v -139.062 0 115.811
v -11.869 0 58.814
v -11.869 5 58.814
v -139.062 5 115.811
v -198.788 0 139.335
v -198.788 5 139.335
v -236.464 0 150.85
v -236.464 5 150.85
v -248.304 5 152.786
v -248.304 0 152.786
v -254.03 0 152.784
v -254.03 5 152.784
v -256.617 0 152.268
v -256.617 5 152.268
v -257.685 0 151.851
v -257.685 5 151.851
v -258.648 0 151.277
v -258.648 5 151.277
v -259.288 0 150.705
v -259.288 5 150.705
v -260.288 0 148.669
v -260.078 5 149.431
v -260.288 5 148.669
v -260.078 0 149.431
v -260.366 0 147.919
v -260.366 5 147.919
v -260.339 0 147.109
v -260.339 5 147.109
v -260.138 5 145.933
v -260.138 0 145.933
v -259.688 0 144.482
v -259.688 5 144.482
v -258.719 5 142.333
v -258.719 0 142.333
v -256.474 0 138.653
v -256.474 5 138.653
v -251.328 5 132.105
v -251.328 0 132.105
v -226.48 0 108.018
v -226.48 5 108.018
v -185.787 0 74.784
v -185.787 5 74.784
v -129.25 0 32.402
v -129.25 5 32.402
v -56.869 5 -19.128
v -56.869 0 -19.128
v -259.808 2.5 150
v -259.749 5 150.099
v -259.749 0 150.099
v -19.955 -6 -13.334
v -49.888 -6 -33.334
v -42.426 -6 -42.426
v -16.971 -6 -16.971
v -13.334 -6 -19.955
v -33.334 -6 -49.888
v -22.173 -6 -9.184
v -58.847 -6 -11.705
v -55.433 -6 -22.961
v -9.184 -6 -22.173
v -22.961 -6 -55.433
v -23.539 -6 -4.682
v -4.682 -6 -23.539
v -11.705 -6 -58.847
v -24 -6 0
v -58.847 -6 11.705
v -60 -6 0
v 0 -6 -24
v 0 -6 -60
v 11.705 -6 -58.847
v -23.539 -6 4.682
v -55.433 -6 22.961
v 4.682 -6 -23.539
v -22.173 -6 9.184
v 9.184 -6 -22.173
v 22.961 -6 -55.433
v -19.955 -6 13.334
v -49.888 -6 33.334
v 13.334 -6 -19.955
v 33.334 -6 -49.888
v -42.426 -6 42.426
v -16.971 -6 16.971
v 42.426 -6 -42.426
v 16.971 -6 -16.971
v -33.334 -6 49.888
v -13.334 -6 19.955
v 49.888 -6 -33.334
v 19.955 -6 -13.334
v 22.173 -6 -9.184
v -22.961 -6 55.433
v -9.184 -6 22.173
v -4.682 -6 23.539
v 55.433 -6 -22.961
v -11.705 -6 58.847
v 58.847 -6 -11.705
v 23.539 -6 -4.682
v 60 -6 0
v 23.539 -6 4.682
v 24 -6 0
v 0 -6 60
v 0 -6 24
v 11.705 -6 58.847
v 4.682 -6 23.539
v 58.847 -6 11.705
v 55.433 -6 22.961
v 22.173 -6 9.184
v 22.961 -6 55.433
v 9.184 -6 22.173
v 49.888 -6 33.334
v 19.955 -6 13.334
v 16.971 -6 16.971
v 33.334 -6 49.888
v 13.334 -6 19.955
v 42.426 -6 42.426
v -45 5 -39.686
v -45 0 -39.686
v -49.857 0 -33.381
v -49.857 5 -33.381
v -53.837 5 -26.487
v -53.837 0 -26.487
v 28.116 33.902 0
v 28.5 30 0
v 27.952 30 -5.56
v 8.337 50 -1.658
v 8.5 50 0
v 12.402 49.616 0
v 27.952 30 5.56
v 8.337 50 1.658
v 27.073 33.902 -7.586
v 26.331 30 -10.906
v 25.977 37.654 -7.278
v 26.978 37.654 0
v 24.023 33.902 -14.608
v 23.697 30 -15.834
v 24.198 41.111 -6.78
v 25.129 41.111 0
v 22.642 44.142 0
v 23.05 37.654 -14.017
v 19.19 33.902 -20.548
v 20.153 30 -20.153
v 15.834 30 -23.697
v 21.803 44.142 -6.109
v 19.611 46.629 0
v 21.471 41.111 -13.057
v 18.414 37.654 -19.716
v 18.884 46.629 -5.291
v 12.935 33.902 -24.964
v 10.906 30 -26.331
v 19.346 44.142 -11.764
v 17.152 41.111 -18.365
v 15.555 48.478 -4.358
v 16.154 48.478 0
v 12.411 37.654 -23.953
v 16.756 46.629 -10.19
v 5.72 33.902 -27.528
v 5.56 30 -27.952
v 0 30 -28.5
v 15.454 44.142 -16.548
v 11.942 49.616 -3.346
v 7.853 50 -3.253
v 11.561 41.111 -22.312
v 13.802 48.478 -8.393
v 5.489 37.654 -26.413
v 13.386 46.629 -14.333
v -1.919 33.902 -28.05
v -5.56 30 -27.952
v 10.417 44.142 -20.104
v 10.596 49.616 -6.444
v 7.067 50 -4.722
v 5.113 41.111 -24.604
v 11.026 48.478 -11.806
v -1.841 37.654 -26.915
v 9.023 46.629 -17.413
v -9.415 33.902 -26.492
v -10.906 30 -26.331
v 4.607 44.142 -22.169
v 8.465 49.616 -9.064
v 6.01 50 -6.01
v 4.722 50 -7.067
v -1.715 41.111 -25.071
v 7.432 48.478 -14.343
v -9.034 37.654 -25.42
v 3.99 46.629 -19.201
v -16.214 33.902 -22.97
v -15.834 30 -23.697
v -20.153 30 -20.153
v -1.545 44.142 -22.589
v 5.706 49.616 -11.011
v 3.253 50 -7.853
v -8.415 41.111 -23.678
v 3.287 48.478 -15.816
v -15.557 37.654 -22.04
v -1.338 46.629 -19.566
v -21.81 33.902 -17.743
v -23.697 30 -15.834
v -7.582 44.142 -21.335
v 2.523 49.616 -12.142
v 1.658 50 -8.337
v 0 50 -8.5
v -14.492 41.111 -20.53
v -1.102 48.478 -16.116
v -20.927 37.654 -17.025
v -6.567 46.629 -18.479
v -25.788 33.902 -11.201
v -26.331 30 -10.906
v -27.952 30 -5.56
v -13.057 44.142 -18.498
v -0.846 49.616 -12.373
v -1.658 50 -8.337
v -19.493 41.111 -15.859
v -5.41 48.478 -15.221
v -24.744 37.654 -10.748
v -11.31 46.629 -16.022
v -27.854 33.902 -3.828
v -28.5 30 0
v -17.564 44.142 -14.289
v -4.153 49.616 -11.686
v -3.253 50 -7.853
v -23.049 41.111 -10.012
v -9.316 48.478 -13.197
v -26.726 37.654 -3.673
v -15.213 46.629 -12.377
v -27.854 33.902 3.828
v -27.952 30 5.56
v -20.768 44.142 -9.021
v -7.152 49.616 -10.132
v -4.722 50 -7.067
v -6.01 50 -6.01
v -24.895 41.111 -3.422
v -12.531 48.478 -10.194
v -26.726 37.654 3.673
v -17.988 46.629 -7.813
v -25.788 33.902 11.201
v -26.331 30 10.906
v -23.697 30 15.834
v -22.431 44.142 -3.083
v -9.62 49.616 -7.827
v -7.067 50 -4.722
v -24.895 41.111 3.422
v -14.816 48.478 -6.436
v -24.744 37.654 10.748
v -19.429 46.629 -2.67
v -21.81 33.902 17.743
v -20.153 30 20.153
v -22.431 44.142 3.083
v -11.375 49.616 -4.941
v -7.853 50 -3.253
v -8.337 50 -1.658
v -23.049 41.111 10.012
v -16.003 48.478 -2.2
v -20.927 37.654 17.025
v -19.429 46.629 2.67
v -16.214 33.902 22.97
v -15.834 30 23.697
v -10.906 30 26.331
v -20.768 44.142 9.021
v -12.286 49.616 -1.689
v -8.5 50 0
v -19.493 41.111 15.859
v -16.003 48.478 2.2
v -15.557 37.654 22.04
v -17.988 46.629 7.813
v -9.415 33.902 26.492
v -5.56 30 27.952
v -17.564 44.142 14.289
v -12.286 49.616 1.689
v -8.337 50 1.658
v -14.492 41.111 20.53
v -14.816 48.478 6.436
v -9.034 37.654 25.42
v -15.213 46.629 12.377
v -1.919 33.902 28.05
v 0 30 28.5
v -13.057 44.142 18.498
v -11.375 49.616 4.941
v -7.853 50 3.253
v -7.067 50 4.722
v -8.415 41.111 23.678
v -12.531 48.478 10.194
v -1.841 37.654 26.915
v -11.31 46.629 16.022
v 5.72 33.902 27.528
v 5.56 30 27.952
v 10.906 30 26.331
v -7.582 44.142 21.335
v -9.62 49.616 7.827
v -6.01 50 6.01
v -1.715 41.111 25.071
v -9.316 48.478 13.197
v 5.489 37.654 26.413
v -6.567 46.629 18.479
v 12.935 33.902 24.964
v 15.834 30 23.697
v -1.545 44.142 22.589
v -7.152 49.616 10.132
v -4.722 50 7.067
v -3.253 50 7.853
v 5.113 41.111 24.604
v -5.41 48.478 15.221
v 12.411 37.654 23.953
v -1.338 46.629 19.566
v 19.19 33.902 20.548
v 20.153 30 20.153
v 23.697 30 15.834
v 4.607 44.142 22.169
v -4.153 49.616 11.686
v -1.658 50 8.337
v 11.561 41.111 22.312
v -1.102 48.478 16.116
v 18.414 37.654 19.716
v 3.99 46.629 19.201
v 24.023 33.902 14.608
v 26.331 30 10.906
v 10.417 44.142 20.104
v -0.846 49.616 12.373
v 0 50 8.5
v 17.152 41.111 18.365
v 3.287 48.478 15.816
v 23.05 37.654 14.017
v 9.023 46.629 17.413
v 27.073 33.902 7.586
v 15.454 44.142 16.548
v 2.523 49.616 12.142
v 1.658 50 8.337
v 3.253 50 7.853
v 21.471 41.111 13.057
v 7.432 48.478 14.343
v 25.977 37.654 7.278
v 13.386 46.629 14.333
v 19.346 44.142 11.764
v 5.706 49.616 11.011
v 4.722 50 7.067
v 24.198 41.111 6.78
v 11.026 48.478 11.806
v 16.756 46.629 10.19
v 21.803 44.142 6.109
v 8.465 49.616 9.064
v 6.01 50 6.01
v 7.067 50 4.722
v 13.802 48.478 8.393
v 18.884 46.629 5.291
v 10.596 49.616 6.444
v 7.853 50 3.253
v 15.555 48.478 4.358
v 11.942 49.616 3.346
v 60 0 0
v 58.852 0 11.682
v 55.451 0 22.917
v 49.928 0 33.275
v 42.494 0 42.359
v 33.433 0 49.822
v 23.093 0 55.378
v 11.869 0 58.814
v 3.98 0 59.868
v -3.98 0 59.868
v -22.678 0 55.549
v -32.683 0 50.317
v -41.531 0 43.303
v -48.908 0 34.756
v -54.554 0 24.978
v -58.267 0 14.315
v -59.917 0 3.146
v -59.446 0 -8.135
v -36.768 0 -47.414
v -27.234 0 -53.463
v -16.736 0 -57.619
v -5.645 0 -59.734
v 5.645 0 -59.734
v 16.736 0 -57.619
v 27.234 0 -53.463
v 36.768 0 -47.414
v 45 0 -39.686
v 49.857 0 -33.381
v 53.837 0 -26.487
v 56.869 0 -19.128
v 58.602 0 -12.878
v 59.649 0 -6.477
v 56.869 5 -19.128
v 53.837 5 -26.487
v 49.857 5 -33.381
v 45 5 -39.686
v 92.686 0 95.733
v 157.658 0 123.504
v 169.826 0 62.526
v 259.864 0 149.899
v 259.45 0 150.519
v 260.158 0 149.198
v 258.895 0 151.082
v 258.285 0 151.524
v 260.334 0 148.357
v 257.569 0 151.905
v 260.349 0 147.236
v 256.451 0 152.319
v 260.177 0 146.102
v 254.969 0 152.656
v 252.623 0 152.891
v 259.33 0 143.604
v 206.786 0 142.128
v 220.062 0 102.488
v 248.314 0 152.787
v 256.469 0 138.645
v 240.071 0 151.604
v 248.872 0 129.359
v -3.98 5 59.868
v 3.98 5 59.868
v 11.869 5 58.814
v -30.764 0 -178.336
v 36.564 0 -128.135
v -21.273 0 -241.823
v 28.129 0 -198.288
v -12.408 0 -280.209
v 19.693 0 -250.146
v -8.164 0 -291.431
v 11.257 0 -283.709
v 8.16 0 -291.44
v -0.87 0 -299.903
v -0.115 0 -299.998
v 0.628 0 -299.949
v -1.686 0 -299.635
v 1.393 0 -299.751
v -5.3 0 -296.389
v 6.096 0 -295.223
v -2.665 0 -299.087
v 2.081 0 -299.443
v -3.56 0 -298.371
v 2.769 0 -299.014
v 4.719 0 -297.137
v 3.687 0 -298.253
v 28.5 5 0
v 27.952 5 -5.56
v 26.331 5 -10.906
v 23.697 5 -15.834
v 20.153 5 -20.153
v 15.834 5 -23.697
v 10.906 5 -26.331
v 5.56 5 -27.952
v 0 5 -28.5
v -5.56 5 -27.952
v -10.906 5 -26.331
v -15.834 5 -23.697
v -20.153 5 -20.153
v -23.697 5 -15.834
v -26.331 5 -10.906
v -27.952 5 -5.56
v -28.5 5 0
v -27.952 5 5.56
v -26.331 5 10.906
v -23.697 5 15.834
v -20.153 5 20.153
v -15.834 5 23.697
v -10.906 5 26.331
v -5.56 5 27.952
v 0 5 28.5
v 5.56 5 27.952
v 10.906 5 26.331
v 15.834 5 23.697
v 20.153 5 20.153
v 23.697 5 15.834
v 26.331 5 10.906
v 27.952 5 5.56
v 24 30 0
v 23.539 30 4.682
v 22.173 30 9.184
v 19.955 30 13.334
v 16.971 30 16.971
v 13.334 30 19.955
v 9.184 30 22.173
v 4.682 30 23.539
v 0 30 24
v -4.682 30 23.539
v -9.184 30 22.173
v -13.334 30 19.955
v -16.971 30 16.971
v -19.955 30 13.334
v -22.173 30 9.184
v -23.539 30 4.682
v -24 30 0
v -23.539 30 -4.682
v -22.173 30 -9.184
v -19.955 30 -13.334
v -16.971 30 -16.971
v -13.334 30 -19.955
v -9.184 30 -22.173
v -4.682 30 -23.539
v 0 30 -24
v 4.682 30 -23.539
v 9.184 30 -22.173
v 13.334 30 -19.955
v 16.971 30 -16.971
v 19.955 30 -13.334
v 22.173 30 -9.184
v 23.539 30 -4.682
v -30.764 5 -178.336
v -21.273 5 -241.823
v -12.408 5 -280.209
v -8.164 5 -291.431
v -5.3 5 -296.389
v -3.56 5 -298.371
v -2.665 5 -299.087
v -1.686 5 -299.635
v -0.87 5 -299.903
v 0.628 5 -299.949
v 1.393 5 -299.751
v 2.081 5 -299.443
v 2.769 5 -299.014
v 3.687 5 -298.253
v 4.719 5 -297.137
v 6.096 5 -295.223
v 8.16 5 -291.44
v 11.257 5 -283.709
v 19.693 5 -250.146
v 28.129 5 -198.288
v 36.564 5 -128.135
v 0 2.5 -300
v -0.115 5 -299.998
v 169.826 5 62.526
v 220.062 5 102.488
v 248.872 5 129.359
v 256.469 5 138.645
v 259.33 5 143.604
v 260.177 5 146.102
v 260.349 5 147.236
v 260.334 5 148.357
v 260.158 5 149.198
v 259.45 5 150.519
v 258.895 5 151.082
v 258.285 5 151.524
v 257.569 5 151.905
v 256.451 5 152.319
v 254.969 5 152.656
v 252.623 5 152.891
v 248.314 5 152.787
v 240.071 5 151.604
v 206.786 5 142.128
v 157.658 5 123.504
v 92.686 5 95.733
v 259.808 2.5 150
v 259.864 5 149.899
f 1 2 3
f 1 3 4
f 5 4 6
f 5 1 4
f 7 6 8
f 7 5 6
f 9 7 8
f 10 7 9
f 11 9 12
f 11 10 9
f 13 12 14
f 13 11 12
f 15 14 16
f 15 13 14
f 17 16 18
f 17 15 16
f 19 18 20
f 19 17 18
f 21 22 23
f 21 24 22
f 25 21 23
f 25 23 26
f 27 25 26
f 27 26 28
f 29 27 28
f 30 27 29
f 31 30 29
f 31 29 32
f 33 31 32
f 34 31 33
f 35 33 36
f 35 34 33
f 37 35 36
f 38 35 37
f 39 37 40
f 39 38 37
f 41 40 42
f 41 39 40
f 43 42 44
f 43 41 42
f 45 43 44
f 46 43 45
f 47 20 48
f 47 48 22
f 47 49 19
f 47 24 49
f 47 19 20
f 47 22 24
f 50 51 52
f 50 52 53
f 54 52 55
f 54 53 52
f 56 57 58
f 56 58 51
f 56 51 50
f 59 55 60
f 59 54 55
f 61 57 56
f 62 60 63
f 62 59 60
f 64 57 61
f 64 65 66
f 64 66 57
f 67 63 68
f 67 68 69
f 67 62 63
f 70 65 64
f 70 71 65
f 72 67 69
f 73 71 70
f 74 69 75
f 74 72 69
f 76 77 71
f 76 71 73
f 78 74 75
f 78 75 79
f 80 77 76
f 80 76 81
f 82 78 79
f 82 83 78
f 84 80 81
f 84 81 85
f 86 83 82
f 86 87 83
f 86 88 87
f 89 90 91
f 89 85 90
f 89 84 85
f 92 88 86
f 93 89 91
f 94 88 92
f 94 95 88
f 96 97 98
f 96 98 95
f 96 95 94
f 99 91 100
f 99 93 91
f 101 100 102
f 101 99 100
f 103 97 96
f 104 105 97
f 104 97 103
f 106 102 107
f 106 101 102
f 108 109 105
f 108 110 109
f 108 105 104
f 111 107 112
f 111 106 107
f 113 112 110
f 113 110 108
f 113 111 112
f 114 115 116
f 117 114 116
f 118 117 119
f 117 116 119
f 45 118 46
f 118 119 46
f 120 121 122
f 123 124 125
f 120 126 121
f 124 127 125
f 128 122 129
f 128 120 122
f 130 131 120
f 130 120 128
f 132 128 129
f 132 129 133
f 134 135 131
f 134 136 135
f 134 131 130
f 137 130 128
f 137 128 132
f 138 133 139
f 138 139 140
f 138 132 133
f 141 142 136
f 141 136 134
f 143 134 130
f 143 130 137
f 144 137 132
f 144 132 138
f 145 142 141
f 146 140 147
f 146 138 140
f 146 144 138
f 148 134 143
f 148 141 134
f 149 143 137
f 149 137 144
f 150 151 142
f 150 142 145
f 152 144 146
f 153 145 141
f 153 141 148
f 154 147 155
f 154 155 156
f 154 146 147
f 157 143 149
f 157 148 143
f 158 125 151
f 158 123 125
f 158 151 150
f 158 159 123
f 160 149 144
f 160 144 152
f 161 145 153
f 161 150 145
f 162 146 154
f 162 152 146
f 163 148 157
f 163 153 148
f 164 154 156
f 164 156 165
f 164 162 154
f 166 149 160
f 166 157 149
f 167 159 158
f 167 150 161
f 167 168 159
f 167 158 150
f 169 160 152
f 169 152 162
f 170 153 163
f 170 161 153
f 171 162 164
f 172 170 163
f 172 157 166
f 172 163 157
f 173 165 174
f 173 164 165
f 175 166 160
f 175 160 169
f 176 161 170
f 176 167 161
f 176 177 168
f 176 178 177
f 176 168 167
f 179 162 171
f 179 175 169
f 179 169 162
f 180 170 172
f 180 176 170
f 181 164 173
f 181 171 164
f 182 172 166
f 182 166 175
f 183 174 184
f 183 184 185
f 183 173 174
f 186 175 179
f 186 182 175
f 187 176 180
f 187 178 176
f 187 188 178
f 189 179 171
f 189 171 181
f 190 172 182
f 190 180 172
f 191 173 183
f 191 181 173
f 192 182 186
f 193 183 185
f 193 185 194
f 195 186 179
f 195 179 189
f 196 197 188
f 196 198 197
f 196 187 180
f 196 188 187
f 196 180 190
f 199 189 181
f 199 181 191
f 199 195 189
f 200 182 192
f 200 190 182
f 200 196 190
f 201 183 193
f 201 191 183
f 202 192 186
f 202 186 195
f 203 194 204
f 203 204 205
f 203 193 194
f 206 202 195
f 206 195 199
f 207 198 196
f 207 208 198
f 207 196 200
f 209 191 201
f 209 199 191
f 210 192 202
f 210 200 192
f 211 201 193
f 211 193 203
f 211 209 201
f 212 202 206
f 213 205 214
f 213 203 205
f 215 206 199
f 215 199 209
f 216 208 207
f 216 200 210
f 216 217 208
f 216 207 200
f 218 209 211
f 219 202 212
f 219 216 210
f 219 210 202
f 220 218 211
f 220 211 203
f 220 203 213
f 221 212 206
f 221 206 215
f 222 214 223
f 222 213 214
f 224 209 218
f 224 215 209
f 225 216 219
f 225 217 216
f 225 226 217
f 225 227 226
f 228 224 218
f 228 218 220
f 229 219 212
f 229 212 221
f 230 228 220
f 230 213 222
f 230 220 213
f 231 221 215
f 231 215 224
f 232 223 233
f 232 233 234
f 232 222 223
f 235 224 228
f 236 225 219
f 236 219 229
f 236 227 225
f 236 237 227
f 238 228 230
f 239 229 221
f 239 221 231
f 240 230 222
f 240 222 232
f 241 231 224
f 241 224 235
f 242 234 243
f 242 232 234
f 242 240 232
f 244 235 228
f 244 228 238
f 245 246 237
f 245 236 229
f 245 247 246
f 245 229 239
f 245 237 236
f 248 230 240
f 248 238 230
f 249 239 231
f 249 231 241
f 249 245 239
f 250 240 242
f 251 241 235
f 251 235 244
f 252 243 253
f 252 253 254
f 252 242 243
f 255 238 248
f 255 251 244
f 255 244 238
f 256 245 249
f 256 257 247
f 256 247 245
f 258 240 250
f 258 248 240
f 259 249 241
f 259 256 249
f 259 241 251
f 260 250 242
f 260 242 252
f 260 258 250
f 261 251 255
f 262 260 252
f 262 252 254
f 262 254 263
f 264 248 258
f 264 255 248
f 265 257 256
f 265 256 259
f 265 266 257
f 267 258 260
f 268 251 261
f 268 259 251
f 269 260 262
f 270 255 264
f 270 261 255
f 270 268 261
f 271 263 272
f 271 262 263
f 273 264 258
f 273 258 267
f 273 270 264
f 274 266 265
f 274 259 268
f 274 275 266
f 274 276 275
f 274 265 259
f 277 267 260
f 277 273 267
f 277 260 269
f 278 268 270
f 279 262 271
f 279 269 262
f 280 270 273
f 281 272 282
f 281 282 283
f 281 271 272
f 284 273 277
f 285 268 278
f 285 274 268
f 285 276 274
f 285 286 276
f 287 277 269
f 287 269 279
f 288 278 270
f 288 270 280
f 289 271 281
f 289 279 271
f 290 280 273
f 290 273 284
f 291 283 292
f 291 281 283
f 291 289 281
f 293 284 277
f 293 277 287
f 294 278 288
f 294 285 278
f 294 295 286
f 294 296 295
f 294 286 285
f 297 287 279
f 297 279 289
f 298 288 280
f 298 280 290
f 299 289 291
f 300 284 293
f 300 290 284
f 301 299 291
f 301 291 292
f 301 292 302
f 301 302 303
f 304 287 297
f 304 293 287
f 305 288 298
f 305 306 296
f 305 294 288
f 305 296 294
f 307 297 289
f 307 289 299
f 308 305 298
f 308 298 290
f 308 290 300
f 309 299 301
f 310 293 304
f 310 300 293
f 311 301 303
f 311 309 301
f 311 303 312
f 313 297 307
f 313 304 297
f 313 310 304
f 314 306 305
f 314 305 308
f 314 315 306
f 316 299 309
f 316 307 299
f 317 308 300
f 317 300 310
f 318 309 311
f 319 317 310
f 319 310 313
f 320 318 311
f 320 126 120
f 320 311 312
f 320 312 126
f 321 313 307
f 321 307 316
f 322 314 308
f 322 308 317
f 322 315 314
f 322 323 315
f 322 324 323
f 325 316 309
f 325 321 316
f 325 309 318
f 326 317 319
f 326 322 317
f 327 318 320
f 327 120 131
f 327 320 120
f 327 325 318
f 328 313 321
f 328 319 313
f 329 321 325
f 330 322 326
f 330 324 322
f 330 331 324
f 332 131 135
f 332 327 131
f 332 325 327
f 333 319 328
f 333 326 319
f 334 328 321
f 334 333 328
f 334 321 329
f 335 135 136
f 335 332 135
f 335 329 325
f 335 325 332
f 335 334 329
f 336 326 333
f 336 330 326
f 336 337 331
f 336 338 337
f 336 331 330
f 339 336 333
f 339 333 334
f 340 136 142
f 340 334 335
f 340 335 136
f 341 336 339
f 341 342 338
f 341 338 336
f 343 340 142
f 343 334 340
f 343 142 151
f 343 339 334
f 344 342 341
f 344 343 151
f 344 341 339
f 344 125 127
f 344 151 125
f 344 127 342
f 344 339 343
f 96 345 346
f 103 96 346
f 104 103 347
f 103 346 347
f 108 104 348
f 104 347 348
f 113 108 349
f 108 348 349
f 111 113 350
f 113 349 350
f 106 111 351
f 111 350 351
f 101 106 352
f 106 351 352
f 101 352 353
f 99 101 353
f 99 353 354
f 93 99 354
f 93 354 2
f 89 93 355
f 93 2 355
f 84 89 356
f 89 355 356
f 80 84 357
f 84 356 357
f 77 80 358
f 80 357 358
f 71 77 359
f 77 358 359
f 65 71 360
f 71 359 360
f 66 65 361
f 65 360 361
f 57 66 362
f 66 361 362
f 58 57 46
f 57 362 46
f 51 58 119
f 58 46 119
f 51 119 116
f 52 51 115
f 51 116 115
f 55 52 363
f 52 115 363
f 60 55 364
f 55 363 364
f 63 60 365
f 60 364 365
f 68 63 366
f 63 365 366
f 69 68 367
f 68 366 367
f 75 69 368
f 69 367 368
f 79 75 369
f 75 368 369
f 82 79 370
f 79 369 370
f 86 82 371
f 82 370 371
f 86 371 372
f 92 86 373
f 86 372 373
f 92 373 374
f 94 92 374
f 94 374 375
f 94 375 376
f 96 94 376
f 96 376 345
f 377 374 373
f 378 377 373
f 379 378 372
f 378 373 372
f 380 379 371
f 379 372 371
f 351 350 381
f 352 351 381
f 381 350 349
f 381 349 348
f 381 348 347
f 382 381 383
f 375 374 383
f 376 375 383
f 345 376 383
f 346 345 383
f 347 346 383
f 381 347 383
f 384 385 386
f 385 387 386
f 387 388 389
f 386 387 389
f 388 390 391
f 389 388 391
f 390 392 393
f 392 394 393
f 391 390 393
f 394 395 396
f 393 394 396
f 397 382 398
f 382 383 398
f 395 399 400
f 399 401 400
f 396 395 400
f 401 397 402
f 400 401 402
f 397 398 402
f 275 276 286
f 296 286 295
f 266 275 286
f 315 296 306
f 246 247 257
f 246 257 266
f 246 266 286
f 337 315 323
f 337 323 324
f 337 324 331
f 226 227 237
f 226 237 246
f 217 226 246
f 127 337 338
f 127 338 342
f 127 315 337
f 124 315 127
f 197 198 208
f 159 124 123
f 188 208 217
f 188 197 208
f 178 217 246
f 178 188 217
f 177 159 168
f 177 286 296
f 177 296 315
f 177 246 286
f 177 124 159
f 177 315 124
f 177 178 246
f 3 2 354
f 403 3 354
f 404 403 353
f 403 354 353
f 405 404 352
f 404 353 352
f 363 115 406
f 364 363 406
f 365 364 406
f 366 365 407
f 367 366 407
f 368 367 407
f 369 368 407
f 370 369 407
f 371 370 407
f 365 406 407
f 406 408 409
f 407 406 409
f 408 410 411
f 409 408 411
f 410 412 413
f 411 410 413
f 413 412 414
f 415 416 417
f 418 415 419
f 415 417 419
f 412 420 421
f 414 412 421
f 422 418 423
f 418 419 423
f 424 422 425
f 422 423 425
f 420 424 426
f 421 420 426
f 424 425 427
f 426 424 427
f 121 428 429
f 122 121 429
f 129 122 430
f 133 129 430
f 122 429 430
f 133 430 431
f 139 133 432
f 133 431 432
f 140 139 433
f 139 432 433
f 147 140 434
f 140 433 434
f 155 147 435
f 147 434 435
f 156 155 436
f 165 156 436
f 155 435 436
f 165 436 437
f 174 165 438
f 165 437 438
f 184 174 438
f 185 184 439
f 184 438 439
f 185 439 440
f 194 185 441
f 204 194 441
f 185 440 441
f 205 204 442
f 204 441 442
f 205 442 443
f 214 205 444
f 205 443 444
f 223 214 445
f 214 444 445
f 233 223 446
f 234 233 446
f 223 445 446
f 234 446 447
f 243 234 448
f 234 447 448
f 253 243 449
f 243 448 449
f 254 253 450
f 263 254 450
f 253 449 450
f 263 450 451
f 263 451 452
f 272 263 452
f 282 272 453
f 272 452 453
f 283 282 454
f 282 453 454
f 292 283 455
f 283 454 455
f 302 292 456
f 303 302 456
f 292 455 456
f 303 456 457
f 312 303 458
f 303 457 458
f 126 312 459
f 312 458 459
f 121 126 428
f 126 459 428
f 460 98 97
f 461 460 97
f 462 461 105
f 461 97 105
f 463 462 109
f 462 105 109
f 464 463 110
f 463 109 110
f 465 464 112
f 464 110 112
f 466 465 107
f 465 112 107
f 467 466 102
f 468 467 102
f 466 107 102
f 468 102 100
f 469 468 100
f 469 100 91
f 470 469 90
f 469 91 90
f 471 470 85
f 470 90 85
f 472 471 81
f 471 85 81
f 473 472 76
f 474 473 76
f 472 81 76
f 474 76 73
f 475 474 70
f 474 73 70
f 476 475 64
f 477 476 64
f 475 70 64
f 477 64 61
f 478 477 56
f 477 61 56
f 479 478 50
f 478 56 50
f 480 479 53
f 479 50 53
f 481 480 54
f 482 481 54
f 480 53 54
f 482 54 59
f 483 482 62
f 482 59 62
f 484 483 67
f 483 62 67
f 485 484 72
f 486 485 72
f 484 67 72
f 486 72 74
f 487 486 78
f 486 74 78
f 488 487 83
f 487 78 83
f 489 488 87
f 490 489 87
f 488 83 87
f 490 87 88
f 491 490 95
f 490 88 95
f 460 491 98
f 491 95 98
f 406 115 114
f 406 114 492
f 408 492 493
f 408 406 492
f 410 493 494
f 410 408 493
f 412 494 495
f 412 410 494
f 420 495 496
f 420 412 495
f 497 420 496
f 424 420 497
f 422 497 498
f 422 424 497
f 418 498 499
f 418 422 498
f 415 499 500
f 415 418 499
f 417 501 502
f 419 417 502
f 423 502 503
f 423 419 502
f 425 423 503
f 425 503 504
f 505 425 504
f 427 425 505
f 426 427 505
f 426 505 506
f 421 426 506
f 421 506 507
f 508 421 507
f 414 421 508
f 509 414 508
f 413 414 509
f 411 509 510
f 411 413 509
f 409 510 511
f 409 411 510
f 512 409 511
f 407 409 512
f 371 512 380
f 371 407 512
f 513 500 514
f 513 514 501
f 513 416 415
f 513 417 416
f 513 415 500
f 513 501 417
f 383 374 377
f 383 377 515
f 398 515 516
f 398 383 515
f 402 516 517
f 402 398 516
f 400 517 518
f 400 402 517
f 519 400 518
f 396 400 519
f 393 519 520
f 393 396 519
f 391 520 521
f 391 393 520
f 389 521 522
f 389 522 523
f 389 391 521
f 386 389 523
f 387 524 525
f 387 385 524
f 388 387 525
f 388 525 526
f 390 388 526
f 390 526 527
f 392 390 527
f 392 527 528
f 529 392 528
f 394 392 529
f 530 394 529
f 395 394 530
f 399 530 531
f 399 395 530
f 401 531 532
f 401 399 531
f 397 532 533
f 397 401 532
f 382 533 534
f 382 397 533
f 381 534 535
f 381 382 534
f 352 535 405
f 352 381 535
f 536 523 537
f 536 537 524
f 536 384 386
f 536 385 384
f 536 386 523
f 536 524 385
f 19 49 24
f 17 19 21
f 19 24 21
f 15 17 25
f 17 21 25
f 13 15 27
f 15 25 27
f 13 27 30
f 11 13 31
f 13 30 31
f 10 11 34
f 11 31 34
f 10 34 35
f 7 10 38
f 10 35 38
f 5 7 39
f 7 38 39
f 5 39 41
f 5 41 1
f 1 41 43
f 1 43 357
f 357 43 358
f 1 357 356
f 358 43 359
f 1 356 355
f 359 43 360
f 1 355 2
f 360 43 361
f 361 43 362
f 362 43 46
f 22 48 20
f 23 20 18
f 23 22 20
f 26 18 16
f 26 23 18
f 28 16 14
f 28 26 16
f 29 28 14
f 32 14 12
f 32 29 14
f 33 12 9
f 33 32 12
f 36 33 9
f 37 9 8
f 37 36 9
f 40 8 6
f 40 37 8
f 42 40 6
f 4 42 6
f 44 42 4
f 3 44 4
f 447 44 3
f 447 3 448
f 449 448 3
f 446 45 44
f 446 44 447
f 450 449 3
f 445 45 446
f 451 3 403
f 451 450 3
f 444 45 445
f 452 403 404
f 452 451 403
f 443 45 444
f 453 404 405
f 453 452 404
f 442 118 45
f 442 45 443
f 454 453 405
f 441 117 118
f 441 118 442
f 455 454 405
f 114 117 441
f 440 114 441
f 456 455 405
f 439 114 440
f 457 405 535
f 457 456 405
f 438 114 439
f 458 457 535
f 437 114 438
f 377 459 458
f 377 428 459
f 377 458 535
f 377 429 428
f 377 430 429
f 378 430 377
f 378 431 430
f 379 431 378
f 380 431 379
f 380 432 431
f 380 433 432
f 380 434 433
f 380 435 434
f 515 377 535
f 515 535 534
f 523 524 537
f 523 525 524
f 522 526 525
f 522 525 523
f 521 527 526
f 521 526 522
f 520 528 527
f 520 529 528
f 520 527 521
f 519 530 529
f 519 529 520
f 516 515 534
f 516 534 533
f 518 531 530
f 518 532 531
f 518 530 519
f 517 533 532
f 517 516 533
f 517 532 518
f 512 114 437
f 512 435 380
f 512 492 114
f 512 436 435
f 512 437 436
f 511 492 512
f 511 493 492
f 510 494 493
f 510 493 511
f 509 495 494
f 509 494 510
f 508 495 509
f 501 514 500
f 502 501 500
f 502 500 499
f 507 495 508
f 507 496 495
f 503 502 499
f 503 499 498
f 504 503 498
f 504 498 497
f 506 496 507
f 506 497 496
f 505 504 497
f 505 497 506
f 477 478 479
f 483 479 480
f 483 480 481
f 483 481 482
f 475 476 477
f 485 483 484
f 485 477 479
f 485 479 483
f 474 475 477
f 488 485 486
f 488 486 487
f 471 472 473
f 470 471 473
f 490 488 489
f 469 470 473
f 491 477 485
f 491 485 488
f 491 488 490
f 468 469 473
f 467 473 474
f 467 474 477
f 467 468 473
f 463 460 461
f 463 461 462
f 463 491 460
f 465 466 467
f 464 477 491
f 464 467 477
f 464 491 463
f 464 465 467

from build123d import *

# Parameters (mm, degrees)
BOSS_EXTRUDE1_DEPTH = 5
SKETCH2_R           = 28.5
BOSS_EXTRUDE2_DEPTH = 45
FILLET1_R           = 20
SKETCH3_R           = 60
BOSS_EXTRUDE3_DEPTH = 6
SKETCH4_R           = 24
CUT_EXTRUDE1_DEPTH  = 36


with BuildPart() as part:
    # Sketch1 → Boss-Extrude1 (new body)
    with BuildSketch(Plane(origin=(0, 0, 0), x_dir=(1, 0, 0), z_dir=(0, 1, 0))):
        with BuildLine():
            ThreePointArc((-45, 39.686269666), (-51.961524227, 30), (-56.869317712, 19.128008337))
            add(Edge.make_bspline(
                [(-11.869317712, -58.814278003), (-485.245924558, -280.156865167), (-56.869317712, 19.128008337)],
                knots=[0, 0, 0, 1, 1, 1], degree=2))
            ThreePointArc((-11.869317712, -58.814278003), (0, -60), (11.869317712, -58.814278003))
            add(Edge.make_bspline(
                [(56.869317712, 19.128008337), (485.245924558, -280.156865167), (11.869317712, -58.814278003)],
                knots=[0, 0, 0, 1, 1, 1], degree=2))
            ThreePointArc((56.869317712, 19.128008337), (51.961524227, 30), (45, 39.686269666))
            add(Edge.make_bspline(
                [(-45, 39.686269666), (0, 560.313730334), (45, 39.686269666)],
                knots=[0, 0, 0, 1, 1, 1], degree=2))
        make_face()
    extrude(amount=BOSS_EXTRUDE1_DEPTH)

    # Sketch2 → Boss-Extrude2 (add)
    with BuildSketch(Plane(origin=(0, 5, 0), x_dir=(1, 0, 0), z_dir=(0, 1, 0))):
        Circle(SKETCH2_R)
    extrude(amount=BOSS_EXTRUDE2_DEPTH)

    # Fillet1
    fillet1_edges = [part.edges().sort_by_distance(p)[0] for p in [
        (-28.5, 50, 0),
    ]]
    fillet(fillet1_edges, radius=FILLET1_R)

    # Sketch3 → Boss-Extrude3 (add)
    with BuildSketch(Plane.XZ):
        Circle(SKETCH3_R)
    extrude(amount=BOSS_EXTRUDE3_DEPTH)

    # Sketch4 → Cut-Extrude1 (cut)
    with BuildSketch(Plane.XZ.offset(6)):
        Circle(SKETCH4_R)
    extrude(amount=-CUT_EXTRUDE1_DEPTH, mode=Mode.SUBTRACT)


solid = part.part
